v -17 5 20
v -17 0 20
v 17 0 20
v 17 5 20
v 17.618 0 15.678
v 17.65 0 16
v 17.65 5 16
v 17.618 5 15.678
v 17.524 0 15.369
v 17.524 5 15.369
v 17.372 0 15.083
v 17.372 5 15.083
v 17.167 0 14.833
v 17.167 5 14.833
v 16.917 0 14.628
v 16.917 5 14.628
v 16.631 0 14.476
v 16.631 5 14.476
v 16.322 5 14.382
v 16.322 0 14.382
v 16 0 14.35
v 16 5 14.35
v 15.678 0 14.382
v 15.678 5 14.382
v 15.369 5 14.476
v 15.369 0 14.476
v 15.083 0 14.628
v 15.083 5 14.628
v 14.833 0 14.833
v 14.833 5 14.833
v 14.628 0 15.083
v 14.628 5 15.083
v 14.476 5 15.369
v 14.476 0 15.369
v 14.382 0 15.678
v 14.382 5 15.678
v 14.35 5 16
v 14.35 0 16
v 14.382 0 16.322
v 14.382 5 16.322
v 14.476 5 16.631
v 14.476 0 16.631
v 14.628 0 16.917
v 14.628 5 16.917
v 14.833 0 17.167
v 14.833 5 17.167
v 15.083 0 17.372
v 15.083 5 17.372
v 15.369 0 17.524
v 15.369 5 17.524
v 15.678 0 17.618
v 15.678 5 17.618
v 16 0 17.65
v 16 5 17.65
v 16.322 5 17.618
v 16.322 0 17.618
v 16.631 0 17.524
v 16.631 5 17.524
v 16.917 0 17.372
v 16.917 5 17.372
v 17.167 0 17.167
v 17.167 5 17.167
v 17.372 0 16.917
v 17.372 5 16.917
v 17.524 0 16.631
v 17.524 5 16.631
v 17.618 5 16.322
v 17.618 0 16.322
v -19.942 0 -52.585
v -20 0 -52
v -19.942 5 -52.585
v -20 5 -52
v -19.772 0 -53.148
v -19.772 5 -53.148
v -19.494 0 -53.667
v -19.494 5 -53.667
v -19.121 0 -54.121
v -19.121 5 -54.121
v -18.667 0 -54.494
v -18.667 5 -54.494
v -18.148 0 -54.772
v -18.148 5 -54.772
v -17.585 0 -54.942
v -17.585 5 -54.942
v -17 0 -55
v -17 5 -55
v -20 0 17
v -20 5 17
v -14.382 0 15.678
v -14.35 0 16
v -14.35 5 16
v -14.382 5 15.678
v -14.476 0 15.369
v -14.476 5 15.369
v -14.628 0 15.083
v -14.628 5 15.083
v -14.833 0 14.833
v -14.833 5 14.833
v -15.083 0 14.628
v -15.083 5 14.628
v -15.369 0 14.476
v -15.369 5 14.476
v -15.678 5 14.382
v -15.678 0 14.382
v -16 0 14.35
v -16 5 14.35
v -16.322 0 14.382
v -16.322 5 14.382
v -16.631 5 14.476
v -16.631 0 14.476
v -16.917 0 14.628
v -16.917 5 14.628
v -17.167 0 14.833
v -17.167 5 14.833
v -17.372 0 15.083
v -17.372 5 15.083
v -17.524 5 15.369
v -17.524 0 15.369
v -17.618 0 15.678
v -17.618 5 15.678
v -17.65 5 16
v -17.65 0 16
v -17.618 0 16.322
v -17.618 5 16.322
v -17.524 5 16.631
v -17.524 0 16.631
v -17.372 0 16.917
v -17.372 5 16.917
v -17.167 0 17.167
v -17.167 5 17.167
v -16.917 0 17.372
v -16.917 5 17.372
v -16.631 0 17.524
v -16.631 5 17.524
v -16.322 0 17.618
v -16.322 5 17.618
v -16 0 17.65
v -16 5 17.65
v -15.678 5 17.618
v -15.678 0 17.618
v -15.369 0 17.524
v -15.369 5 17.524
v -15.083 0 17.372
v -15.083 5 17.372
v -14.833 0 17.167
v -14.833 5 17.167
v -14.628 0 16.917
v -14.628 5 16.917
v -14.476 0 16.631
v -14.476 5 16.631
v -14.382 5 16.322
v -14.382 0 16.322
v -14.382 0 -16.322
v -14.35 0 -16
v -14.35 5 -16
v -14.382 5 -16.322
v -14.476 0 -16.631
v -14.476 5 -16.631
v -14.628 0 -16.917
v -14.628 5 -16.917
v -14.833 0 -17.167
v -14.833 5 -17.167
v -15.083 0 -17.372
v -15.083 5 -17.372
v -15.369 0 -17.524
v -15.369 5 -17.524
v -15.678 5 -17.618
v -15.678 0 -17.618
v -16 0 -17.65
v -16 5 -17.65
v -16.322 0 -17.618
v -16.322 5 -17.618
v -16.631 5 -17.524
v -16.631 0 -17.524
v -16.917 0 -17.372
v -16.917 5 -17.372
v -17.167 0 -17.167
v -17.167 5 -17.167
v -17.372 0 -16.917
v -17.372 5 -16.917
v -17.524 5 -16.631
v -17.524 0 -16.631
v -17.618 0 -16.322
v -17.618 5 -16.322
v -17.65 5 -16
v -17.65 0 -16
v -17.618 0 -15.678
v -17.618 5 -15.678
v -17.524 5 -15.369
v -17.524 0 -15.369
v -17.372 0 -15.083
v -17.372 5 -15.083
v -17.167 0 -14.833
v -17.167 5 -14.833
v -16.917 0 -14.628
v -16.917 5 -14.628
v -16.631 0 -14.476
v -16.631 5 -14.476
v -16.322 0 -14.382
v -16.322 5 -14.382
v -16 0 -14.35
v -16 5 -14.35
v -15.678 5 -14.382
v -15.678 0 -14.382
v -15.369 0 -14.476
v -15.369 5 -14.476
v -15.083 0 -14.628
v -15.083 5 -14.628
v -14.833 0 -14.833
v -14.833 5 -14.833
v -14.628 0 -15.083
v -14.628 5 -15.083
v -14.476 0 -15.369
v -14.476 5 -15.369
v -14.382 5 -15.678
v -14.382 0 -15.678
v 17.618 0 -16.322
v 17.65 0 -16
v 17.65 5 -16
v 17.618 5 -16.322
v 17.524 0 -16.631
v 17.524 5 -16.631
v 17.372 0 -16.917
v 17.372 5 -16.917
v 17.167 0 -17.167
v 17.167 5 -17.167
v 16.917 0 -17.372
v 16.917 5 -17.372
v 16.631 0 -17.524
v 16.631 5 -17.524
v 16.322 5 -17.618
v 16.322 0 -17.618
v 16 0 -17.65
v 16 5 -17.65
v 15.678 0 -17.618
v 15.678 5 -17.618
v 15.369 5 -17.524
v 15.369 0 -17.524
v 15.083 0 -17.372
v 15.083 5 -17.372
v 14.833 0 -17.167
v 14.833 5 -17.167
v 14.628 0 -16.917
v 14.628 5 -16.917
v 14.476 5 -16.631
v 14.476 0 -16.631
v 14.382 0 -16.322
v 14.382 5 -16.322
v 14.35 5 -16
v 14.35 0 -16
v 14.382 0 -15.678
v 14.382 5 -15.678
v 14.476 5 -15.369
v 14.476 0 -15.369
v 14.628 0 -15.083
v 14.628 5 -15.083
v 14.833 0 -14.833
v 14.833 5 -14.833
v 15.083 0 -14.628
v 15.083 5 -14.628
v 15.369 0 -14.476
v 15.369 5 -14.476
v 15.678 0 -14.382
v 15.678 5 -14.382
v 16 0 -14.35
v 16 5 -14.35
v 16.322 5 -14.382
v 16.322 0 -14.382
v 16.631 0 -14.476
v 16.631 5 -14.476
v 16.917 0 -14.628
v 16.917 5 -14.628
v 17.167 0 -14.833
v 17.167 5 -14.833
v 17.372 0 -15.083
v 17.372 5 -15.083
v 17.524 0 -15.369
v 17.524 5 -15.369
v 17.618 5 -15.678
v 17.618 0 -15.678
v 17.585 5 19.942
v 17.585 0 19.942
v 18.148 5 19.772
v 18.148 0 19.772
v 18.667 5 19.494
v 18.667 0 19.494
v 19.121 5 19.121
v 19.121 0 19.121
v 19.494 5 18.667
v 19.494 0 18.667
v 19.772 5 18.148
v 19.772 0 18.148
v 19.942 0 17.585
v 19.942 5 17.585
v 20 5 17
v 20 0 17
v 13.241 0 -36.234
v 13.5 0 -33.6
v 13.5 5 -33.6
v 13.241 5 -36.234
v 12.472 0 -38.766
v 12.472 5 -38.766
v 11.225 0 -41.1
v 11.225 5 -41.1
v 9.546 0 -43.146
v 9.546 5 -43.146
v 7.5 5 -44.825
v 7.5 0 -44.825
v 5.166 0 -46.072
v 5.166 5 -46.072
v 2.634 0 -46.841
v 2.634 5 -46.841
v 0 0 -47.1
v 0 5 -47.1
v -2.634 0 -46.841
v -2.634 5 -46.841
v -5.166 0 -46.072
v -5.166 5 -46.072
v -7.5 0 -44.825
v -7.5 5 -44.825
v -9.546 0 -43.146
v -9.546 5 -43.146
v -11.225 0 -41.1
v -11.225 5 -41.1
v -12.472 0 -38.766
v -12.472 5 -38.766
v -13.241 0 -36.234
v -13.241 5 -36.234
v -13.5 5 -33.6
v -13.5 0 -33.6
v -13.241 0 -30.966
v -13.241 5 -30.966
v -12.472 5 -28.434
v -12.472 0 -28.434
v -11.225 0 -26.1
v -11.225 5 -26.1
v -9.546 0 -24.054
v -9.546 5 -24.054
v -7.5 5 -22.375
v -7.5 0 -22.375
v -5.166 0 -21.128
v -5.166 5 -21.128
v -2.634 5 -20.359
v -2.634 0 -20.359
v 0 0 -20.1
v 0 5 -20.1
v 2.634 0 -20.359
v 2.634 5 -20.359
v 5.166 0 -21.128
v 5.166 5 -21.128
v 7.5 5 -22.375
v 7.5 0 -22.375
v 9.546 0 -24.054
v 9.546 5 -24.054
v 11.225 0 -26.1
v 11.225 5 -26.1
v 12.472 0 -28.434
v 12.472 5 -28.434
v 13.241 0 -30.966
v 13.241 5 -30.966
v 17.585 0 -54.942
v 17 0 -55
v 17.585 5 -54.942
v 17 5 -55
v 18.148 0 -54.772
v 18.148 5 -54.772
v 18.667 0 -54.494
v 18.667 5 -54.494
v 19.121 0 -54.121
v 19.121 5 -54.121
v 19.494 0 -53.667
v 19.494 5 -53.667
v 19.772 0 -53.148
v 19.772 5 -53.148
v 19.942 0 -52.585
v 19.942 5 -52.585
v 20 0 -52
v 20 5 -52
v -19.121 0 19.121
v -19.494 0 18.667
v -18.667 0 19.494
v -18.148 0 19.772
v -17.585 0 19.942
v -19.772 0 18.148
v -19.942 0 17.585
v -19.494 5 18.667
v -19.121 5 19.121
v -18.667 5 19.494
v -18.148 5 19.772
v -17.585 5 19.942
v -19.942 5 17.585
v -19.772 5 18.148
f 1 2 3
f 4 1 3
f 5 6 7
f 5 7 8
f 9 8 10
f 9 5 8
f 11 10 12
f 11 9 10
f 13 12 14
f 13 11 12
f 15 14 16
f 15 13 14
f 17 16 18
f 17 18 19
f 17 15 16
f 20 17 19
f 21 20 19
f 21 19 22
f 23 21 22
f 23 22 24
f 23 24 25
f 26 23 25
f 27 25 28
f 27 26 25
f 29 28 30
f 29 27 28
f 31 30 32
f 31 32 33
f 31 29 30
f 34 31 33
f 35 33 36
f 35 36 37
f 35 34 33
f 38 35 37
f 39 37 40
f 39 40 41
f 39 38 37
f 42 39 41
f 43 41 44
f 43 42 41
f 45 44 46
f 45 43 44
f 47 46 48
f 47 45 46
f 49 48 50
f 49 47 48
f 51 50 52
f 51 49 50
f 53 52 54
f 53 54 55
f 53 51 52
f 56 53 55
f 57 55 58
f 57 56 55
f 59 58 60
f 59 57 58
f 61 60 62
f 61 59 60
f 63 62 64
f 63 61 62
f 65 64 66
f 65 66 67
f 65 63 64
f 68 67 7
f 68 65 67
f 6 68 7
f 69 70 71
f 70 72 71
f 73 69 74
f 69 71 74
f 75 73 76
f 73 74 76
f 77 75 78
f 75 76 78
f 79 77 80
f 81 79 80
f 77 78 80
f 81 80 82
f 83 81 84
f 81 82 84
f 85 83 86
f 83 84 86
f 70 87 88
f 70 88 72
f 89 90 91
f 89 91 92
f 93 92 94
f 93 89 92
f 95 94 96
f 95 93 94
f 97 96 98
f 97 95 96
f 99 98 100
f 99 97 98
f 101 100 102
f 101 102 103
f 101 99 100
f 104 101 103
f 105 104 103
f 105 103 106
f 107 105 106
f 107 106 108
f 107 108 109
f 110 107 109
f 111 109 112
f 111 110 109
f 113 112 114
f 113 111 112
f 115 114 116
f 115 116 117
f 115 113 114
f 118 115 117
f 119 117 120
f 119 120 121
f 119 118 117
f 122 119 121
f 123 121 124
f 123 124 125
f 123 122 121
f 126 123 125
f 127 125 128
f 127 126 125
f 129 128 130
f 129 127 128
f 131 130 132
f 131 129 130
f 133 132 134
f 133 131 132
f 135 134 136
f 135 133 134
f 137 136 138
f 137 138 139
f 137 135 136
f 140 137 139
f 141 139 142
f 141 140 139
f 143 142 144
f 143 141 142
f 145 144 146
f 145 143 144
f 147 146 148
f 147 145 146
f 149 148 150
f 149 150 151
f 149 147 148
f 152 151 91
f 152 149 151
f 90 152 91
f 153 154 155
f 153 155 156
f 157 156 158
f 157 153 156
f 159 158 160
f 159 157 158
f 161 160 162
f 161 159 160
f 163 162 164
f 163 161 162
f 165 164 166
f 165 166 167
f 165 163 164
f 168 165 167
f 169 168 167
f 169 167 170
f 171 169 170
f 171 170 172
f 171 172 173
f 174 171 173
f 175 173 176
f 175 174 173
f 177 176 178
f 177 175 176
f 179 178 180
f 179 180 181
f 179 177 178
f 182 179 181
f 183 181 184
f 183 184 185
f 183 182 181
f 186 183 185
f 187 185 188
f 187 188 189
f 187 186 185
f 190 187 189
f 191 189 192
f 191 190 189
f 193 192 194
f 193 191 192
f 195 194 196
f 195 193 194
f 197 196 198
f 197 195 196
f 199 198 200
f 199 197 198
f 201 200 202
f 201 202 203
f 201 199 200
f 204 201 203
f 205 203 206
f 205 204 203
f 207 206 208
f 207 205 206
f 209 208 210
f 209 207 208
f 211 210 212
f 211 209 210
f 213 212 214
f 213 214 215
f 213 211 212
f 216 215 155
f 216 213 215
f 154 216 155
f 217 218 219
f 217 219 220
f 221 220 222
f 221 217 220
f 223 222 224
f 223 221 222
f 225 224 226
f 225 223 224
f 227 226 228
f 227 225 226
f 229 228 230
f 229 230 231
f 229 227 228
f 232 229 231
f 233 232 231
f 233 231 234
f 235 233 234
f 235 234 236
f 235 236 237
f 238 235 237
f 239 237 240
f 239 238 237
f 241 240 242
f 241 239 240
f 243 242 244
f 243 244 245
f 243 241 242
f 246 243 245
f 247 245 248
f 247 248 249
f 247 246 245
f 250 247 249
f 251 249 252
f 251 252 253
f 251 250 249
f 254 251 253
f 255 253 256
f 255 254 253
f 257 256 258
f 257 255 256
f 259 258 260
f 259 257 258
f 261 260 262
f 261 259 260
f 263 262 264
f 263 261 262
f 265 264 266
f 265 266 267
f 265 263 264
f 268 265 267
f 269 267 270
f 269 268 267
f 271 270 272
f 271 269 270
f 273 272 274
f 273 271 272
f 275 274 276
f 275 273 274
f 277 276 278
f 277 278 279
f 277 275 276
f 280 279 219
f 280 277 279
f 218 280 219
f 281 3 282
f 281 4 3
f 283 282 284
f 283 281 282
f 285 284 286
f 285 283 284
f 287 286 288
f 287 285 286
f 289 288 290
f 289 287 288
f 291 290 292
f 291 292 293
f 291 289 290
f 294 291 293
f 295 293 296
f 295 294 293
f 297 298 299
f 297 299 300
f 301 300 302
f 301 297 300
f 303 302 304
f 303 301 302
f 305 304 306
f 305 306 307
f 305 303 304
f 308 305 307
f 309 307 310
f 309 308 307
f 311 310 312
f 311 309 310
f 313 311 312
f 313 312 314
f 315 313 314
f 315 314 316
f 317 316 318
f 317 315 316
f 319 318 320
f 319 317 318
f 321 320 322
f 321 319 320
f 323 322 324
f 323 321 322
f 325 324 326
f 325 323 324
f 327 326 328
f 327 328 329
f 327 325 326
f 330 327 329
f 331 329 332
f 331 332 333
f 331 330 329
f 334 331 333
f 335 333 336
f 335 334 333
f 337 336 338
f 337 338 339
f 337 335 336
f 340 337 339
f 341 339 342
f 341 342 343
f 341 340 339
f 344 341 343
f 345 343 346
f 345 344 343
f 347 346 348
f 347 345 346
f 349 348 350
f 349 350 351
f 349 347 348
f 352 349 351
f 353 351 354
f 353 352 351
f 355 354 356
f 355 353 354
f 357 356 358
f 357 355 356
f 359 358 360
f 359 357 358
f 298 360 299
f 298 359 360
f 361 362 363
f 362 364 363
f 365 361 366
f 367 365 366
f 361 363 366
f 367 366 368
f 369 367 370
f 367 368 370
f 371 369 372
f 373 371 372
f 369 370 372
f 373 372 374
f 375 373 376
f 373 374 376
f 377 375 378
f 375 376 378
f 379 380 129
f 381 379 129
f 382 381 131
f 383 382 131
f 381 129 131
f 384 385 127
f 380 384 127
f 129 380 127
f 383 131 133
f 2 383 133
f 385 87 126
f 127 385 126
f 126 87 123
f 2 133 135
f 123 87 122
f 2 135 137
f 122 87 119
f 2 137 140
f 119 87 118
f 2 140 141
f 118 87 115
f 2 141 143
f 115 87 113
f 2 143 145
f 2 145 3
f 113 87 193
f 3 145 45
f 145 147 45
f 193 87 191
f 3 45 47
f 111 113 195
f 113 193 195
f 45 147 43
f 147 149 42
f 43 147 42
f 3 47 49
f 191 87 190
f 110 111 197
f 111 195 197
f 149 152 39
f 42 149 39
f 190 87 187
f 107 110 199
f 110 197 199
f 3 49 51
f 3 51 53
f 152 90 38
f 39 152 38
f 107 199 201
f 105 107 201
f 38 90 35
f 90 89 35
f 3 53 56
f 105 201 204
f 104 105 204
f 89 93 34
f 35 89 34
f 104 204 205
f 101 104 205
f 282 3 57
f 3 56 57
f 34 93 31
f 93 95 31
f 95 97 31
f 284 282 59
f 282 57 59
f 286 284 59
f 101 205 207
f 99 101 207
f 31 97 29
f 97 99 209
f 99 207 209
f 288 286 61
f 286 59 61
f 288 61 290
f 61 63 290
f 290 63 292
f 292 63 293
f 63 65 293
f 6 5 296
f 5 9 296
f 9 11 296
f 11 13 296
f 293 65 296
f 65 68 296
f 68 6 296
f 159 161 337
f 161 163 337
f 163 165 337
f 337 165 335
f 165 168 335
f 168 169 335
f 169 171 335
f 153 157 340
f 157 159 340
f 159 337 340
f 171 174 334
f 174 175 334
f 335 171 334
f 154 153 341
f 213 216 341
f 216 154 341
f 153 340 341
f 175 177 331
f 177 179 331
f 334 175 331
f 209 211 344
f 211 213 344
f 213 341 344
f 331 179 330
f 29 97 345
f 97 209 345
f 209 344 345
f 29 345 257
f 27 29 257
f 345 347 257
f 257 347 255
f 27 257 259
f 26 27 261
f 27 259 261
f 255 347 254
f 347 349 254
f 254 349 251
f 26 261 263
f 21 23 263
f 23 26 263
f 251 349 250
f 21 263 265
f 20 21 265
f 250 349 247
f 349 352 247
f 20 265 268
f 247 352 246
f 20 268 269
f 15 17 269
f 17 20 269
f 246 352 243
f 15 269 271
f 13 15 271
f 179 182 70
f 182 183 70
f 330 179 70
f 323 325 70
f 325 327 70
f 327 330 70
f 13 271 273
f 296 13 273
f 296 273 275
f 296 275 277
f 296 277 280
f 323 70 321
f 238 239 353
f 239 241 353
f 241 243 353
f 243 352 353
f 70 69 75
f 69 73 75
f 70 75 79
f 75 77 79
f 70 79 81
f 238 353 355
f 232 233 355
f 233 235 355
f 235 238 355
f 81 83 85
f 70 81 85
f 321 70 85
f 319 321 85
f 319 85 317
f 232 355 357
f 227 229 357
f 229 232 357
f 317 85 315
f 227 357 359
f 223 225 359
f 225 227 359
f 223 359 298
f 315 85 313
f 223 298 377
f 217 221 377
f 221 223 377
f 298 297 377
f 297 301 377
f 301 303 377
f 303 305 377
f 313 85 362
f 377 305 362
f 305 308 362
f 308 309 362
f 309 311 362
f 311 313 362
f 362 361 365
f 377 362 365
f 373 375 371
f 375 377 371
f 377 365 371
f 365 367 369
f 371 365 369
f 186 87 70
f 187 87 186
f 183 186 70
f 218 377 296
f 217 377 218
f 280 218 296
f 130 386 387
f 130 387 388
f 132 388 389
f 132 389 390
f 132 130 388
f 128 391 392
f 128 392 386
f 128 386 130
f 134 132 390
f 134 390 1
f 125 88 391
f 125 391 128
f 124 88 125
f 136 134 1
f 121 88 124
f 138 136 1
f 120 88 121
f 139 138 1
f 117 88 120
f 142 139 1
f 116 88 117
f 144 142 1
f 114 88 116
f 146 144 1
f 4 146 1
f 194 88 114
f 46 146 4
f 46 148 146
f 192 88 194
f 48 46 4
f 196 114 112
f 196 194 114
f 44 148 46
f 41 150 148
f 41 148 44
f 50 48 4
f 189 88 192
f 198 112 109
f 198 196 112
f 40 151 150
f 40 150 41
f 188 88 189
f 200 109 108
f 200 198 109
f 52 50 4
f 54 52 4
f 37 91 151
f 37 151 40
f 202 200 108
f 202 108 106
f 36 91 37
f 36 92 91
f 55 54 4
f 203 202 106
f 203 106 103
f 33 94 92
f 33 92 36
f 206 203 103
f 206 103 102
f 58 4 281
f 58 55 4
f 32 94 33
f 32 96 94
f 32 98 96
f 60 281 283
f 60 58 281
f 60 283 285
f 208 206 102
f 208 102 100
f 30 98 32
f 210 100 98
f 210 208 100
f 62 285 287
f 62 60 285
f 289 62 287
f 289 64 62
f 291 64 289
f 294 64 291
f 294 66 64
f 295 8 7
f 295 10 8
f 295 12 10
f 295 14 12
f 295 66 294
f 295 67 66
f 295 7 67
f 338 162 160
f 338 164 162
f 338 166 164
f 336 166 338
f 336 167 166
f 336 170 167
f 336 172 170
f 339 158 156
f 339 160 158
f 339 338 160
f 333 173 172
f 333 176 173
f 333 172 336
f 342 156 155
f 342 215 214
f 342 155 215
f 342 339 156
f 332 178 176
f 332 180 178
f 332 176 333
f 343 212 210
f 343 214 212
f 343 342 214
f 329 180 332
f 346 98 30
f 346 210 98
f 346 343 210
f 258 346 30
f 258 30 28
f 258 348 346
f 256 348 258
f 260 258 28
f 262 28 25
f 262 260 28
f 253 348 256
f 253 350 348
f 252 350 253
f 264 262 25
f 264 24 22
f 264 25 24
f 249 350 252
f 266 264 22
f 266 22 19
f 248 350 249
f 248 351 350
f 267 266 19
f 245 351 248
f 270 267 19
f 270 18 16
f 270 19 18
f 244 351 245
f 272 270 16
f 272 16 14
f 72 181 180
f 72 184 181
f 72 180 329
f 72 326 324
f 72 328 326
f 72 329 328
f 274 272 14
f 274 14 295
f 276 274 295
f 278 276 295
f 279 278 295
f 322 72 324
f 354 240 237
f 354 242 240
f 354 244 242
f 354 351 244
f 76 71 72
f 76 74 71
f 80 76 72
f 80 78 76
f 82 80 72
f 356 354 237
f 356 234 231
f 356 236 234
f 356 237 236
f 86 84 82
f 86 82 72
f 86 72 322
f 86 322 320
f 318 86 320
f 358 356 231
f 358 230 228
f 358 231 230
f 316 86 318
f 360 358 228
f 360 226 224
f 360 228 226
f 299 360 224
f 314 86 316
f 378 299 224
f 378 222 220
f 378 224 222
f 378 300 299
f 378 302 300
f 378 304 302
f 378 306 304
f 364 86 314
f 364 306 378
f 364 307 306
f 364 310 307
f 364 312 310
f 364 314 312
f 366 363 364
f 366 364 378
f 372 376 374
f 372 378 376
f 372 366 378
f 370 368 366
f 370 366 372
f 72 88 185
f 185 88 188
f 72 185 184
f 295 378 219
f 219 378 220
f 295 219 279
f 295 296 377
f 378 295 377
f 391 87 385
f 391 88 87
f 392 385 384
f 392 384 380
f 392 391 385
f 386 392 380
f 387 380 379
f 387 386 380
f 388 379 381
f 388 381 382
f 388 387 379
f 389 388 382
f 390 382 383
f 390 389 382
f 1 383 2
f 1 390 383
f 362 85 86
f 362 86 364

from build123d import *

# Parameters (mm, degrees)
SKETCH_1_W      = 40
SKETCH_1_H      = 75
SKETCH_1_R      = 1.65
SKETCH_1_R_2    = 13.5
EXTRUDE_1_DEPTH = 5
FILLET_1_R      = 3


with BuildPart() as part:
    # 草图1 → 凸台-拉伸1 (new body)
    with BuildSketch(Plane(origin=(0, 0, 0), x_dir=(1, 0, 0), z_dir=(0, 1, 0))):
        with Locations((0, 17.5)):
            Rectangle(SKETCH_1_W, SKETCH_1_H)
        with Locations((-16, 16)):
            Circle(SKETCH_1_R, mode=Mode.SUBTRACT)
        with Locations((16, 16)):
            Circle(SKETCH_1_R, mode=Mode.SUBTRACT)
        with Locations((16, -16)):
            Circle(SKETCH_1_R, mode=Mode.SUBTRACT)
        with Locations((-16, -16)):
            Circle(SKETCH_1_R, mode=Mode.SUBTRACT)
        with Locations((0, 33.6)):
            Circle(SKETCH_1_R_2, mode=Mode.SUBTRACT)
    extrude(amount=EXTRUDE_1_DEPTH)

    # 圆角1
    fillet_1_edges = [part.edges().sort_by_distance(p)[0] for p in [
        (20, 2.5, 20),
        (-20, 2.5, 20),
        (-20, 2.5, -55),
        (20, 2.5, -55),
    ]]
    fillet(fillet_1_edges, radius=FILLET_1_R)


solid = part.part
